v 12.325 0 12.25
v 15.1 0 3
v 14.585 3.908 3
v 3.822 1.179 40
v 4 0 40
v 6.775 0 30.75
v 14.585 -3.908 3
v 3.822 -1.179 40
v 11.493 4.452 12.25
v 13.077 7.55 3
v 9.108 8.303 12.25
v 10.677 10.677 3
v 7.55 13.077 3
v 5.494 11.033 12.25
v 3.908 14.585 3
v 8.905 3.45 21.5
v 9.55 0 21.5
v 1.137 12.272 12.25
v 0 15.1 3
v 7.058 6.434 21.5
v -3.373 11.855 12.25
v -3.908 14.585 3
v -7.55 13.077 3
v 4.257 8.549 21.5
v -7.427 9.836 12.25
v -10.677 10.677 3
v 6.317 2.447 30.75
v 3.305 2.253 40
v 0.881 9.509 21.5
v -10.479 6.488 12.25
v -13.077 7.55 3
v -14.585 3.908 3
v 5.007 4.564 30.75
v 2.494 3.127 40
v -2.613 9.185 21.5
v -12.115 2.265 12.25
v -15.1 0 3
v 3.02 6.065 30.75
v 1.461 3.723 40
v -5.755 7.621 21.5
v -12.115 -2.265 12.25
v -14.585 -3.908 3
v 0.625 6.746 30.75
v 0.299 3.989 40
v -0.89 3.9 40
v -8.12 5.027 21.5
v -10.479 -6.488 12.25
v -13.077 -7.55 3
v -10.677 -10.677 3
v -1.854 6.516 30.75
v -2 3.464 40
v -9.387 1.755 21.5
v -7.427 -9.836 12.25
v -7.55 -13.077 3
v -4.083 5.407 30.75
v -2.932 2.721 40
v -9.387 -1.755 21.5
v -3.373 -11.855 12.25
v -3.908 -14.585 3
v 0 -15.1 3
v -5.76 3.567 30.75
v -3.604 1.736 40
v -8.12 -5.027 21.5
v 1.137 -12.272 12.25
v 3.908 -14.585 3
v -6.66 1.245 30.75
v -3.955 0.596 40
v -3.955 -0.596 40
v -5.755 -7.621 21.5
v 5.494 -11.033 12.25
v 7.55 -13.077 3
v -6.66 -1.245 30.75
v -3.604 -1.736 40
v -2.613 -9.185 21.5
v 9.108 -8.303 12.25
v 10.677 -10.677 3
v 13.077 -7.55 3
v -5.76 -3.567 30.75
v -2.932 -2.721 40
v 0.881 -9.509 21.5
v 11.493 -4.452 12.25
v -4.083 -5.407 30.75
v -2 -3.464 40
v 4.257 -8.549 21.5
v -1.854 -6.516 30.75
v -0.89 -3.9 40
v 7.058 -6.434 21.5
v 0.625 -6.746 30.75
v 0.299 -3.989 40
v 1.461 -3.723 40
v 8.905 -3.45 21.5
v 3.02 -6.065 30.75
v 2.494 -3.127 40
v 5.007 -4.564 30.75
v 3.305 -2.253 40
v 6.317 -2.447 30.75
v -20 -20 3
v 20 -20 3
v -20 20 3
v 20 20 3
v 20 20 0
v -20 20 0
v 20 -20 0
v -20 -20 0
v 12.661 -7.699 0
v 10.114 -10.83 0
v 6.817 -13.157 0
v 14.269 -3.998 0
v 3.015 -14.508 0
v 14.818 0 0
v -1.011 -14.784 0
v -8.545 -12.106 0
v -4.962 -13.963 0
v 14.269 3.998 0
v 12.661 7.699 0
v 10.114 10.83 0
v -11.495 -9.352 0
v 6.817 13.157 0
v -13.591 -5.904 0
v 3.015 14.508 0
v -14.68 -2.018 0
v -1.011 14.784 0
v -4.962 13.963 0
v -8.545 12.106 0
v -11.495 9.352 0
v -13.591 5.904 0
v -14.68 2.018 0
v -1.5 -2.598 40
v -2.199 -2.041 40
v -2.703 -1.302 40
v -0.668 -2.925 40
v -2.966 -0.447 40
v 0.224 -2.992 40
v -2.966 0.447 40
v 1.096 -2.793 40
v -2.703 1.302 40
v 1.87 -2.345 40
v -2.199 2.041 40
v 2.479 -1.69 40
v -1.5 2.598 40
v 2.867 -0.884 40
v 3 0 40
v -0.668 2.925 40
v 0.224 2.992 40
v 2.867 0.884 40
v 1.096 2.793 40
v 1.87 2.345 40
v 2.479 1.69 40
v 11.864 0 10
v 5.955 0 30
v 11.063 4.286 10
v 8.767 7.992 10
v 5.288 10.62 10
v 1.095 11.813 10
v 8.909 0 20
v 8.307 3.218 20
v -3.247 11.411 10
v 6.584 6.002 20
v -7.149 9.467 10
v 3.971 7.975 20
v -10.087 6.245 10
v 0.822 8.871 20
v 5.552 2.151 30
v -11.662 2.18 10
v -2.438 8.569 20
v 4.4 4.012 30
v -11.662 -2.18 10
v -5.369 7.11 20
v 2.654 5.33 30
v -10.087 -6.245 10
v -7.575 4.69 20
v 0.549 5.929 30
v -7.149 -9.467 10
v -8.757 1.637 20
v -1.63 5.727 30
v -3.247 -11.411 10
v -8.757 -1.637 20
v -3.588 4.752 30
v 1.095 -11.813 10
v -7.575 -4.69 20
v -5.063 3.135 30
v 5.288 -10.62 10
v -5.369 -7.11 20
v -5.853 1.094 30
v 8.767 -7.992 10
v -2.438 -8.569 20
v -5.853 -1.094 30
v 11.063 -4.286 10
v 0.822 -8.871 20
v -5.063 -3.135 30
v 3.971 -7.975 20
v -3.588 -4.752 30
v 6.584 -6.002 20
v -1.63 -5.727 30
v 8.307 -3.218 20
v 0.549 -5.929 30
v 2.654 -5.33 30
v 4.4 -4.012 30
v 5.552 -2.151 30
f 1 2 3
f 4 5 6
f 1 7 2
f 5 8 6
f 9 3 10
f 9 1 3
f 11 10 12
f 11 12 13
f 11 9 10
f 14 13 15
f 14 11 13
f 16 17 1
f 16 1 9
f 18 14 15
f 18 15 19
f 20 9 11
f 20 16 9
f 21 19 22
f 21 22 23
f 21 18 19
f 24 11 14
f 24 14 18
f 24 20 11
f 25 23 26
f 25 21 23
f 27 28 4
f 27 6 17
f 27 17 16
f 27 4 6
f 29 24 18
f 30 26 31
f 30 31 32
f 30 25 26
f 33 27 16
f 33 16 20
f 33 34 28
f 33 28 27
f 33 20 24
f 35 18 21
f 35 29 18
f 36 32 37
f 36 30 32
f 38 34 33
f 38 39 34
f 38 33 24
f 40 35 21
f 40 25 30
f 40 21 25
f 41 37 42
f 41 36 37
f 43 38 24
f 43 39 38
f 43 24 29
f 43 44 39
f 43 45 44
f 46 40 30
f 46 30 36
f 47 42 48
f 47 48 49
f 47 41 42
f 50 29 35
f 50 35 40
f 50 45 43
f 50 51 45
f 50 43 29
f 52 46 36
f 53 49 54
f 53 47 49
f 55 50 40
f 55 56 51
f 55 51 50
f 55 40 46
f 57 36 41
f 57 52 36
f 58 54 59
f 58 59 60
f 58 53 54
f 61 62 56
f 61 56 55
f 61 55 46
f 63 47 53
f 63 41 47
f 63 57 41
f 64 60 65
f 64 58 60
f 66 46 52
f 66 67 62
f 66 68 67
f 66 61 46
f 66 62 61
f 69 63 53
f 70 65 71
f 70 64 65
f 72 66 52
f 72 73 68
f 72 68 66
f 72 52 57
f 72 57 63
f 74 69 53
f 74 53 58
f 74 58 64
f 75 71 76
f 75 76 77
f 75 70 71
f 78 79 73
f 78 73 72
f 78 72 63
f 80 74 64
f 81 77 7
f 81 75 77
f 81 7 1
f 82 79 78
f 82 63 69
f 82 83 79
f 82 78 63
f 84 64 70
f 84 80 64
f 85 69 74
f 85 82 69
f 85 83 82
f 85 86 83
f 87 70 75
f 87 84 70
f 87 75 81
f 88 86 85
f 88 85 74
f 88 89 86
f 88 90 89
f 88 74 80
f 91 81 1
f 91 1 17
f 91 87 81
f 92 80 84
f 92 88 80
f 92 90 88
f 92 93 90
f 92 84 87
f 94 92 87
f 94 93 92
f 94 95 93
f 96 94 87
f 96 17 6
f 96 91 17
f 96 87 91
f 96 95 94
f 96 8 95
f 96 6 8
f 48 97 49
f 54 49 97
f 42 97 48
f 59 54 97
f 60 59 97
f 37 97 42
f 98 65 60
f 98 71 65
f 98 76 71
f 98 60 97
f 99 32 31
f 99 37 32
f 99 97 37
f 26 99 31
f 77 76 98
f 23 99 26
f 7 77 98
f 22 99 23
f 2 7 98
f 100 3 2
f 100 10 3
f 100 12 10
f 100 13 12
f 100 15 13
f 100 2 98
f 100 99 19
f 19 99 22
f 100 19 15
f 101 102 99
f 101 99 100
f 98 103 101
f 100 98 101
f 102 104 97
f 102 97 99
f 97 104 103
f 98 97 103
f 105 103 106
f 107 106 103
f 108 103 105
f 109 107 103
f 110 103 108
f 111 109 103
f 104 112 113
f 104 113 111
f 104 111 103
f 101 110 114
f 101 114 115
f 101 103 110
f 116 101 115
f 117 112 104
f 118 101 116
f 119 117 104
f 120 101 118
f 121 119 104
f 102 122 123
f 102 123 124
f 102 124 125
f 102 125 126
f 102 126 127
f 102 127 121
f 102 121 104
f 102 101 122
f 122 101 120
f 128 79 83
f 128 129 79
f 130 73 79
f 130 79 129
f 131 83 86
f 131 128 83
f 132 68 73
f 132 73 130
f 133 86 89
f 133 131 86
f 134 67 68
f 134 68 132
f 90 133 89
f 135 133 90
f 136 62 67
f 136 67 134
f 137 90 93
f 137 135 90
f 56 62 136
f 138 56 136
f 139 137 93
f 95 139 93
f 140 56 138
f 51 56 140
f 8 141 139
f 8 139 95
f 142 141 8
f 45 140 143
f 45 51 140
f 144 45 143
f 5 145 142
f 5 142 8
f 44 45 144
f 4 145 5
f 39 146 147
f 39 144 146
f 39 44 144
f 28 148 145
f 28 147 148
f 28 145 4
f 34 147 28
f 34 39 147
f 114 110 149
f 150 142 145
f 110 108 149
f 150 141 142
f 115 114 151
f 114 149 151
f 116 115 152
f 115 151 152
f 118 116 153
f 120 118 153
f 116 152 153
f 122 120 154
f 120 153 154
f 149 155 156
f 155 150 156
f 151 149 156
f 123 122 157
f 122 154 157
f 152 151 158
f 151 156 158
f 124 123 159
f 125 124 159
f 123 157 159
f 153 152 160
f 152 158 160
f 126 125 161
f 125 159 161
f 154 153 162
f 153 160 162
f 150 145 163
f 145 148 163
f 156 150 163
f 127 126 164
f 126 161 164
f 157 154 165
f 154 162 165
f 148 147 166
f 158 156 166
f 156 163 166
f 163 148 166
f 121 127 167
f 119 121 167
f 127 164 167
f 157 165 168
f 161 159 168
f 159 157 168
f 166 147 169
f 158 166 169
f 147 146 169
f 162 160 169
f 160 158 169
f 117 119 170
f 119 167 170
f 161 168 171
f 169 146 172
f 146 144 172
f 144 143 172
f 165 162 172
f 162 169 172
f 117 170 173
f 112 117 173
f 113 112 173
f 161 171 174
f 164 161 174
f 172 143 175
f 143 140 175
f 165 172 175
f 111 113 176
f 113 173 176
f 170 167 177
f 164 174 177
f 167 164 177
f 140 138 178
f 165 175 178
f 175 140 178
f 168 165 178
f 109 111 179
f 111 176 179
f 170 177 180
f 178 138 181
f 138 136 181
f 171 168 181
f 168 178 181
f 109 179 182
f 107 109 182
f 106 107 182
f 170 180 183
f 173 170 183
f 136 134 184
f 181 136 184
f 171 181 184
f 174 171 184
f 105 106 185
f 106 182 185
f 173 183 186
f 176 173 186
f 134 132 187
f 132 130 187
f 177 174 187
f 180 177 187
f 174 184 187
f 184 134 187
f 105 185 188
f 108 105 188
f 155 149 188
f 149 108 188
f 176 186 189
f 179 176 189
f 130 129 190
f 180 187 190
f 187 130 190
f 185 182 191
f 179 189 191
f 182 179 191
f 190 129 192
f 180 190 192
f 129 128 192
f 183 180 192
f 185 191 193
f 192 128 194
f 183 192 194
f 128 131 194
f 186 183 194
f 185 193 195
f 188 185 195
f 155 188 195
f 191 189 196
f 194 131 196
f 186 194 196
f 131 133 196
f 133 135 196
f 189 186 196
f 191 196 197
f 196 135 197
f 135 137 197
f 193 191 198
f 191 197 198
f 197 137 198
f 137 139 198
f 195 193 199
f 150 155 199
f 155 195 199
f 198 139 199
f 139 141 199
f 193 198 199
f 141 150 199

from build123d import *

# Parameters (mm, degrees)
BOX_W     = 40
BOX_H     = 40
BOX_DEPTH = 3


with BuildPart() as cono:
    # Cone001 → Cone001 (revolve)
    with BuildSketch(Plane(origin=(0, 0, -4), x_dir=(1, 0, 0), z_dir=(0, -1, 0))):
        Polygon((0, 0), (16, 0), (3, 44), (0, 44), align=None)
    revolve(axis=Axis((0, 0, -4), (0, 0, 1)))


with BuildPart() as cone:
    # Cone → Cone (revolve)
    with BuildSketch(Plane.XZ):
        Polygon((0, 0), (16, 0), (4, 40), (0, 40), align=None)
    revolve(axis=Axis((0, 0, 0), (0, 0, 1)))


with BuildPart() as cut:
    # Box → Box (new body)
    with BuildSketch(Plane(origin=(-20, -20, 0), x_dir=(1, 0, 0), z_dir=(0, 0, 1))):
        with Locations((20, 20)):
            Rectangle(BOX_W, BOX_H)
    extrude(amount=BOX_DEPTH)

    # Fusion: union Cone
    add(cone.part)

    # Cut: cut Cono
    add(cono.part, mode=Mode.SUBTRACT)


solid = cut.part
